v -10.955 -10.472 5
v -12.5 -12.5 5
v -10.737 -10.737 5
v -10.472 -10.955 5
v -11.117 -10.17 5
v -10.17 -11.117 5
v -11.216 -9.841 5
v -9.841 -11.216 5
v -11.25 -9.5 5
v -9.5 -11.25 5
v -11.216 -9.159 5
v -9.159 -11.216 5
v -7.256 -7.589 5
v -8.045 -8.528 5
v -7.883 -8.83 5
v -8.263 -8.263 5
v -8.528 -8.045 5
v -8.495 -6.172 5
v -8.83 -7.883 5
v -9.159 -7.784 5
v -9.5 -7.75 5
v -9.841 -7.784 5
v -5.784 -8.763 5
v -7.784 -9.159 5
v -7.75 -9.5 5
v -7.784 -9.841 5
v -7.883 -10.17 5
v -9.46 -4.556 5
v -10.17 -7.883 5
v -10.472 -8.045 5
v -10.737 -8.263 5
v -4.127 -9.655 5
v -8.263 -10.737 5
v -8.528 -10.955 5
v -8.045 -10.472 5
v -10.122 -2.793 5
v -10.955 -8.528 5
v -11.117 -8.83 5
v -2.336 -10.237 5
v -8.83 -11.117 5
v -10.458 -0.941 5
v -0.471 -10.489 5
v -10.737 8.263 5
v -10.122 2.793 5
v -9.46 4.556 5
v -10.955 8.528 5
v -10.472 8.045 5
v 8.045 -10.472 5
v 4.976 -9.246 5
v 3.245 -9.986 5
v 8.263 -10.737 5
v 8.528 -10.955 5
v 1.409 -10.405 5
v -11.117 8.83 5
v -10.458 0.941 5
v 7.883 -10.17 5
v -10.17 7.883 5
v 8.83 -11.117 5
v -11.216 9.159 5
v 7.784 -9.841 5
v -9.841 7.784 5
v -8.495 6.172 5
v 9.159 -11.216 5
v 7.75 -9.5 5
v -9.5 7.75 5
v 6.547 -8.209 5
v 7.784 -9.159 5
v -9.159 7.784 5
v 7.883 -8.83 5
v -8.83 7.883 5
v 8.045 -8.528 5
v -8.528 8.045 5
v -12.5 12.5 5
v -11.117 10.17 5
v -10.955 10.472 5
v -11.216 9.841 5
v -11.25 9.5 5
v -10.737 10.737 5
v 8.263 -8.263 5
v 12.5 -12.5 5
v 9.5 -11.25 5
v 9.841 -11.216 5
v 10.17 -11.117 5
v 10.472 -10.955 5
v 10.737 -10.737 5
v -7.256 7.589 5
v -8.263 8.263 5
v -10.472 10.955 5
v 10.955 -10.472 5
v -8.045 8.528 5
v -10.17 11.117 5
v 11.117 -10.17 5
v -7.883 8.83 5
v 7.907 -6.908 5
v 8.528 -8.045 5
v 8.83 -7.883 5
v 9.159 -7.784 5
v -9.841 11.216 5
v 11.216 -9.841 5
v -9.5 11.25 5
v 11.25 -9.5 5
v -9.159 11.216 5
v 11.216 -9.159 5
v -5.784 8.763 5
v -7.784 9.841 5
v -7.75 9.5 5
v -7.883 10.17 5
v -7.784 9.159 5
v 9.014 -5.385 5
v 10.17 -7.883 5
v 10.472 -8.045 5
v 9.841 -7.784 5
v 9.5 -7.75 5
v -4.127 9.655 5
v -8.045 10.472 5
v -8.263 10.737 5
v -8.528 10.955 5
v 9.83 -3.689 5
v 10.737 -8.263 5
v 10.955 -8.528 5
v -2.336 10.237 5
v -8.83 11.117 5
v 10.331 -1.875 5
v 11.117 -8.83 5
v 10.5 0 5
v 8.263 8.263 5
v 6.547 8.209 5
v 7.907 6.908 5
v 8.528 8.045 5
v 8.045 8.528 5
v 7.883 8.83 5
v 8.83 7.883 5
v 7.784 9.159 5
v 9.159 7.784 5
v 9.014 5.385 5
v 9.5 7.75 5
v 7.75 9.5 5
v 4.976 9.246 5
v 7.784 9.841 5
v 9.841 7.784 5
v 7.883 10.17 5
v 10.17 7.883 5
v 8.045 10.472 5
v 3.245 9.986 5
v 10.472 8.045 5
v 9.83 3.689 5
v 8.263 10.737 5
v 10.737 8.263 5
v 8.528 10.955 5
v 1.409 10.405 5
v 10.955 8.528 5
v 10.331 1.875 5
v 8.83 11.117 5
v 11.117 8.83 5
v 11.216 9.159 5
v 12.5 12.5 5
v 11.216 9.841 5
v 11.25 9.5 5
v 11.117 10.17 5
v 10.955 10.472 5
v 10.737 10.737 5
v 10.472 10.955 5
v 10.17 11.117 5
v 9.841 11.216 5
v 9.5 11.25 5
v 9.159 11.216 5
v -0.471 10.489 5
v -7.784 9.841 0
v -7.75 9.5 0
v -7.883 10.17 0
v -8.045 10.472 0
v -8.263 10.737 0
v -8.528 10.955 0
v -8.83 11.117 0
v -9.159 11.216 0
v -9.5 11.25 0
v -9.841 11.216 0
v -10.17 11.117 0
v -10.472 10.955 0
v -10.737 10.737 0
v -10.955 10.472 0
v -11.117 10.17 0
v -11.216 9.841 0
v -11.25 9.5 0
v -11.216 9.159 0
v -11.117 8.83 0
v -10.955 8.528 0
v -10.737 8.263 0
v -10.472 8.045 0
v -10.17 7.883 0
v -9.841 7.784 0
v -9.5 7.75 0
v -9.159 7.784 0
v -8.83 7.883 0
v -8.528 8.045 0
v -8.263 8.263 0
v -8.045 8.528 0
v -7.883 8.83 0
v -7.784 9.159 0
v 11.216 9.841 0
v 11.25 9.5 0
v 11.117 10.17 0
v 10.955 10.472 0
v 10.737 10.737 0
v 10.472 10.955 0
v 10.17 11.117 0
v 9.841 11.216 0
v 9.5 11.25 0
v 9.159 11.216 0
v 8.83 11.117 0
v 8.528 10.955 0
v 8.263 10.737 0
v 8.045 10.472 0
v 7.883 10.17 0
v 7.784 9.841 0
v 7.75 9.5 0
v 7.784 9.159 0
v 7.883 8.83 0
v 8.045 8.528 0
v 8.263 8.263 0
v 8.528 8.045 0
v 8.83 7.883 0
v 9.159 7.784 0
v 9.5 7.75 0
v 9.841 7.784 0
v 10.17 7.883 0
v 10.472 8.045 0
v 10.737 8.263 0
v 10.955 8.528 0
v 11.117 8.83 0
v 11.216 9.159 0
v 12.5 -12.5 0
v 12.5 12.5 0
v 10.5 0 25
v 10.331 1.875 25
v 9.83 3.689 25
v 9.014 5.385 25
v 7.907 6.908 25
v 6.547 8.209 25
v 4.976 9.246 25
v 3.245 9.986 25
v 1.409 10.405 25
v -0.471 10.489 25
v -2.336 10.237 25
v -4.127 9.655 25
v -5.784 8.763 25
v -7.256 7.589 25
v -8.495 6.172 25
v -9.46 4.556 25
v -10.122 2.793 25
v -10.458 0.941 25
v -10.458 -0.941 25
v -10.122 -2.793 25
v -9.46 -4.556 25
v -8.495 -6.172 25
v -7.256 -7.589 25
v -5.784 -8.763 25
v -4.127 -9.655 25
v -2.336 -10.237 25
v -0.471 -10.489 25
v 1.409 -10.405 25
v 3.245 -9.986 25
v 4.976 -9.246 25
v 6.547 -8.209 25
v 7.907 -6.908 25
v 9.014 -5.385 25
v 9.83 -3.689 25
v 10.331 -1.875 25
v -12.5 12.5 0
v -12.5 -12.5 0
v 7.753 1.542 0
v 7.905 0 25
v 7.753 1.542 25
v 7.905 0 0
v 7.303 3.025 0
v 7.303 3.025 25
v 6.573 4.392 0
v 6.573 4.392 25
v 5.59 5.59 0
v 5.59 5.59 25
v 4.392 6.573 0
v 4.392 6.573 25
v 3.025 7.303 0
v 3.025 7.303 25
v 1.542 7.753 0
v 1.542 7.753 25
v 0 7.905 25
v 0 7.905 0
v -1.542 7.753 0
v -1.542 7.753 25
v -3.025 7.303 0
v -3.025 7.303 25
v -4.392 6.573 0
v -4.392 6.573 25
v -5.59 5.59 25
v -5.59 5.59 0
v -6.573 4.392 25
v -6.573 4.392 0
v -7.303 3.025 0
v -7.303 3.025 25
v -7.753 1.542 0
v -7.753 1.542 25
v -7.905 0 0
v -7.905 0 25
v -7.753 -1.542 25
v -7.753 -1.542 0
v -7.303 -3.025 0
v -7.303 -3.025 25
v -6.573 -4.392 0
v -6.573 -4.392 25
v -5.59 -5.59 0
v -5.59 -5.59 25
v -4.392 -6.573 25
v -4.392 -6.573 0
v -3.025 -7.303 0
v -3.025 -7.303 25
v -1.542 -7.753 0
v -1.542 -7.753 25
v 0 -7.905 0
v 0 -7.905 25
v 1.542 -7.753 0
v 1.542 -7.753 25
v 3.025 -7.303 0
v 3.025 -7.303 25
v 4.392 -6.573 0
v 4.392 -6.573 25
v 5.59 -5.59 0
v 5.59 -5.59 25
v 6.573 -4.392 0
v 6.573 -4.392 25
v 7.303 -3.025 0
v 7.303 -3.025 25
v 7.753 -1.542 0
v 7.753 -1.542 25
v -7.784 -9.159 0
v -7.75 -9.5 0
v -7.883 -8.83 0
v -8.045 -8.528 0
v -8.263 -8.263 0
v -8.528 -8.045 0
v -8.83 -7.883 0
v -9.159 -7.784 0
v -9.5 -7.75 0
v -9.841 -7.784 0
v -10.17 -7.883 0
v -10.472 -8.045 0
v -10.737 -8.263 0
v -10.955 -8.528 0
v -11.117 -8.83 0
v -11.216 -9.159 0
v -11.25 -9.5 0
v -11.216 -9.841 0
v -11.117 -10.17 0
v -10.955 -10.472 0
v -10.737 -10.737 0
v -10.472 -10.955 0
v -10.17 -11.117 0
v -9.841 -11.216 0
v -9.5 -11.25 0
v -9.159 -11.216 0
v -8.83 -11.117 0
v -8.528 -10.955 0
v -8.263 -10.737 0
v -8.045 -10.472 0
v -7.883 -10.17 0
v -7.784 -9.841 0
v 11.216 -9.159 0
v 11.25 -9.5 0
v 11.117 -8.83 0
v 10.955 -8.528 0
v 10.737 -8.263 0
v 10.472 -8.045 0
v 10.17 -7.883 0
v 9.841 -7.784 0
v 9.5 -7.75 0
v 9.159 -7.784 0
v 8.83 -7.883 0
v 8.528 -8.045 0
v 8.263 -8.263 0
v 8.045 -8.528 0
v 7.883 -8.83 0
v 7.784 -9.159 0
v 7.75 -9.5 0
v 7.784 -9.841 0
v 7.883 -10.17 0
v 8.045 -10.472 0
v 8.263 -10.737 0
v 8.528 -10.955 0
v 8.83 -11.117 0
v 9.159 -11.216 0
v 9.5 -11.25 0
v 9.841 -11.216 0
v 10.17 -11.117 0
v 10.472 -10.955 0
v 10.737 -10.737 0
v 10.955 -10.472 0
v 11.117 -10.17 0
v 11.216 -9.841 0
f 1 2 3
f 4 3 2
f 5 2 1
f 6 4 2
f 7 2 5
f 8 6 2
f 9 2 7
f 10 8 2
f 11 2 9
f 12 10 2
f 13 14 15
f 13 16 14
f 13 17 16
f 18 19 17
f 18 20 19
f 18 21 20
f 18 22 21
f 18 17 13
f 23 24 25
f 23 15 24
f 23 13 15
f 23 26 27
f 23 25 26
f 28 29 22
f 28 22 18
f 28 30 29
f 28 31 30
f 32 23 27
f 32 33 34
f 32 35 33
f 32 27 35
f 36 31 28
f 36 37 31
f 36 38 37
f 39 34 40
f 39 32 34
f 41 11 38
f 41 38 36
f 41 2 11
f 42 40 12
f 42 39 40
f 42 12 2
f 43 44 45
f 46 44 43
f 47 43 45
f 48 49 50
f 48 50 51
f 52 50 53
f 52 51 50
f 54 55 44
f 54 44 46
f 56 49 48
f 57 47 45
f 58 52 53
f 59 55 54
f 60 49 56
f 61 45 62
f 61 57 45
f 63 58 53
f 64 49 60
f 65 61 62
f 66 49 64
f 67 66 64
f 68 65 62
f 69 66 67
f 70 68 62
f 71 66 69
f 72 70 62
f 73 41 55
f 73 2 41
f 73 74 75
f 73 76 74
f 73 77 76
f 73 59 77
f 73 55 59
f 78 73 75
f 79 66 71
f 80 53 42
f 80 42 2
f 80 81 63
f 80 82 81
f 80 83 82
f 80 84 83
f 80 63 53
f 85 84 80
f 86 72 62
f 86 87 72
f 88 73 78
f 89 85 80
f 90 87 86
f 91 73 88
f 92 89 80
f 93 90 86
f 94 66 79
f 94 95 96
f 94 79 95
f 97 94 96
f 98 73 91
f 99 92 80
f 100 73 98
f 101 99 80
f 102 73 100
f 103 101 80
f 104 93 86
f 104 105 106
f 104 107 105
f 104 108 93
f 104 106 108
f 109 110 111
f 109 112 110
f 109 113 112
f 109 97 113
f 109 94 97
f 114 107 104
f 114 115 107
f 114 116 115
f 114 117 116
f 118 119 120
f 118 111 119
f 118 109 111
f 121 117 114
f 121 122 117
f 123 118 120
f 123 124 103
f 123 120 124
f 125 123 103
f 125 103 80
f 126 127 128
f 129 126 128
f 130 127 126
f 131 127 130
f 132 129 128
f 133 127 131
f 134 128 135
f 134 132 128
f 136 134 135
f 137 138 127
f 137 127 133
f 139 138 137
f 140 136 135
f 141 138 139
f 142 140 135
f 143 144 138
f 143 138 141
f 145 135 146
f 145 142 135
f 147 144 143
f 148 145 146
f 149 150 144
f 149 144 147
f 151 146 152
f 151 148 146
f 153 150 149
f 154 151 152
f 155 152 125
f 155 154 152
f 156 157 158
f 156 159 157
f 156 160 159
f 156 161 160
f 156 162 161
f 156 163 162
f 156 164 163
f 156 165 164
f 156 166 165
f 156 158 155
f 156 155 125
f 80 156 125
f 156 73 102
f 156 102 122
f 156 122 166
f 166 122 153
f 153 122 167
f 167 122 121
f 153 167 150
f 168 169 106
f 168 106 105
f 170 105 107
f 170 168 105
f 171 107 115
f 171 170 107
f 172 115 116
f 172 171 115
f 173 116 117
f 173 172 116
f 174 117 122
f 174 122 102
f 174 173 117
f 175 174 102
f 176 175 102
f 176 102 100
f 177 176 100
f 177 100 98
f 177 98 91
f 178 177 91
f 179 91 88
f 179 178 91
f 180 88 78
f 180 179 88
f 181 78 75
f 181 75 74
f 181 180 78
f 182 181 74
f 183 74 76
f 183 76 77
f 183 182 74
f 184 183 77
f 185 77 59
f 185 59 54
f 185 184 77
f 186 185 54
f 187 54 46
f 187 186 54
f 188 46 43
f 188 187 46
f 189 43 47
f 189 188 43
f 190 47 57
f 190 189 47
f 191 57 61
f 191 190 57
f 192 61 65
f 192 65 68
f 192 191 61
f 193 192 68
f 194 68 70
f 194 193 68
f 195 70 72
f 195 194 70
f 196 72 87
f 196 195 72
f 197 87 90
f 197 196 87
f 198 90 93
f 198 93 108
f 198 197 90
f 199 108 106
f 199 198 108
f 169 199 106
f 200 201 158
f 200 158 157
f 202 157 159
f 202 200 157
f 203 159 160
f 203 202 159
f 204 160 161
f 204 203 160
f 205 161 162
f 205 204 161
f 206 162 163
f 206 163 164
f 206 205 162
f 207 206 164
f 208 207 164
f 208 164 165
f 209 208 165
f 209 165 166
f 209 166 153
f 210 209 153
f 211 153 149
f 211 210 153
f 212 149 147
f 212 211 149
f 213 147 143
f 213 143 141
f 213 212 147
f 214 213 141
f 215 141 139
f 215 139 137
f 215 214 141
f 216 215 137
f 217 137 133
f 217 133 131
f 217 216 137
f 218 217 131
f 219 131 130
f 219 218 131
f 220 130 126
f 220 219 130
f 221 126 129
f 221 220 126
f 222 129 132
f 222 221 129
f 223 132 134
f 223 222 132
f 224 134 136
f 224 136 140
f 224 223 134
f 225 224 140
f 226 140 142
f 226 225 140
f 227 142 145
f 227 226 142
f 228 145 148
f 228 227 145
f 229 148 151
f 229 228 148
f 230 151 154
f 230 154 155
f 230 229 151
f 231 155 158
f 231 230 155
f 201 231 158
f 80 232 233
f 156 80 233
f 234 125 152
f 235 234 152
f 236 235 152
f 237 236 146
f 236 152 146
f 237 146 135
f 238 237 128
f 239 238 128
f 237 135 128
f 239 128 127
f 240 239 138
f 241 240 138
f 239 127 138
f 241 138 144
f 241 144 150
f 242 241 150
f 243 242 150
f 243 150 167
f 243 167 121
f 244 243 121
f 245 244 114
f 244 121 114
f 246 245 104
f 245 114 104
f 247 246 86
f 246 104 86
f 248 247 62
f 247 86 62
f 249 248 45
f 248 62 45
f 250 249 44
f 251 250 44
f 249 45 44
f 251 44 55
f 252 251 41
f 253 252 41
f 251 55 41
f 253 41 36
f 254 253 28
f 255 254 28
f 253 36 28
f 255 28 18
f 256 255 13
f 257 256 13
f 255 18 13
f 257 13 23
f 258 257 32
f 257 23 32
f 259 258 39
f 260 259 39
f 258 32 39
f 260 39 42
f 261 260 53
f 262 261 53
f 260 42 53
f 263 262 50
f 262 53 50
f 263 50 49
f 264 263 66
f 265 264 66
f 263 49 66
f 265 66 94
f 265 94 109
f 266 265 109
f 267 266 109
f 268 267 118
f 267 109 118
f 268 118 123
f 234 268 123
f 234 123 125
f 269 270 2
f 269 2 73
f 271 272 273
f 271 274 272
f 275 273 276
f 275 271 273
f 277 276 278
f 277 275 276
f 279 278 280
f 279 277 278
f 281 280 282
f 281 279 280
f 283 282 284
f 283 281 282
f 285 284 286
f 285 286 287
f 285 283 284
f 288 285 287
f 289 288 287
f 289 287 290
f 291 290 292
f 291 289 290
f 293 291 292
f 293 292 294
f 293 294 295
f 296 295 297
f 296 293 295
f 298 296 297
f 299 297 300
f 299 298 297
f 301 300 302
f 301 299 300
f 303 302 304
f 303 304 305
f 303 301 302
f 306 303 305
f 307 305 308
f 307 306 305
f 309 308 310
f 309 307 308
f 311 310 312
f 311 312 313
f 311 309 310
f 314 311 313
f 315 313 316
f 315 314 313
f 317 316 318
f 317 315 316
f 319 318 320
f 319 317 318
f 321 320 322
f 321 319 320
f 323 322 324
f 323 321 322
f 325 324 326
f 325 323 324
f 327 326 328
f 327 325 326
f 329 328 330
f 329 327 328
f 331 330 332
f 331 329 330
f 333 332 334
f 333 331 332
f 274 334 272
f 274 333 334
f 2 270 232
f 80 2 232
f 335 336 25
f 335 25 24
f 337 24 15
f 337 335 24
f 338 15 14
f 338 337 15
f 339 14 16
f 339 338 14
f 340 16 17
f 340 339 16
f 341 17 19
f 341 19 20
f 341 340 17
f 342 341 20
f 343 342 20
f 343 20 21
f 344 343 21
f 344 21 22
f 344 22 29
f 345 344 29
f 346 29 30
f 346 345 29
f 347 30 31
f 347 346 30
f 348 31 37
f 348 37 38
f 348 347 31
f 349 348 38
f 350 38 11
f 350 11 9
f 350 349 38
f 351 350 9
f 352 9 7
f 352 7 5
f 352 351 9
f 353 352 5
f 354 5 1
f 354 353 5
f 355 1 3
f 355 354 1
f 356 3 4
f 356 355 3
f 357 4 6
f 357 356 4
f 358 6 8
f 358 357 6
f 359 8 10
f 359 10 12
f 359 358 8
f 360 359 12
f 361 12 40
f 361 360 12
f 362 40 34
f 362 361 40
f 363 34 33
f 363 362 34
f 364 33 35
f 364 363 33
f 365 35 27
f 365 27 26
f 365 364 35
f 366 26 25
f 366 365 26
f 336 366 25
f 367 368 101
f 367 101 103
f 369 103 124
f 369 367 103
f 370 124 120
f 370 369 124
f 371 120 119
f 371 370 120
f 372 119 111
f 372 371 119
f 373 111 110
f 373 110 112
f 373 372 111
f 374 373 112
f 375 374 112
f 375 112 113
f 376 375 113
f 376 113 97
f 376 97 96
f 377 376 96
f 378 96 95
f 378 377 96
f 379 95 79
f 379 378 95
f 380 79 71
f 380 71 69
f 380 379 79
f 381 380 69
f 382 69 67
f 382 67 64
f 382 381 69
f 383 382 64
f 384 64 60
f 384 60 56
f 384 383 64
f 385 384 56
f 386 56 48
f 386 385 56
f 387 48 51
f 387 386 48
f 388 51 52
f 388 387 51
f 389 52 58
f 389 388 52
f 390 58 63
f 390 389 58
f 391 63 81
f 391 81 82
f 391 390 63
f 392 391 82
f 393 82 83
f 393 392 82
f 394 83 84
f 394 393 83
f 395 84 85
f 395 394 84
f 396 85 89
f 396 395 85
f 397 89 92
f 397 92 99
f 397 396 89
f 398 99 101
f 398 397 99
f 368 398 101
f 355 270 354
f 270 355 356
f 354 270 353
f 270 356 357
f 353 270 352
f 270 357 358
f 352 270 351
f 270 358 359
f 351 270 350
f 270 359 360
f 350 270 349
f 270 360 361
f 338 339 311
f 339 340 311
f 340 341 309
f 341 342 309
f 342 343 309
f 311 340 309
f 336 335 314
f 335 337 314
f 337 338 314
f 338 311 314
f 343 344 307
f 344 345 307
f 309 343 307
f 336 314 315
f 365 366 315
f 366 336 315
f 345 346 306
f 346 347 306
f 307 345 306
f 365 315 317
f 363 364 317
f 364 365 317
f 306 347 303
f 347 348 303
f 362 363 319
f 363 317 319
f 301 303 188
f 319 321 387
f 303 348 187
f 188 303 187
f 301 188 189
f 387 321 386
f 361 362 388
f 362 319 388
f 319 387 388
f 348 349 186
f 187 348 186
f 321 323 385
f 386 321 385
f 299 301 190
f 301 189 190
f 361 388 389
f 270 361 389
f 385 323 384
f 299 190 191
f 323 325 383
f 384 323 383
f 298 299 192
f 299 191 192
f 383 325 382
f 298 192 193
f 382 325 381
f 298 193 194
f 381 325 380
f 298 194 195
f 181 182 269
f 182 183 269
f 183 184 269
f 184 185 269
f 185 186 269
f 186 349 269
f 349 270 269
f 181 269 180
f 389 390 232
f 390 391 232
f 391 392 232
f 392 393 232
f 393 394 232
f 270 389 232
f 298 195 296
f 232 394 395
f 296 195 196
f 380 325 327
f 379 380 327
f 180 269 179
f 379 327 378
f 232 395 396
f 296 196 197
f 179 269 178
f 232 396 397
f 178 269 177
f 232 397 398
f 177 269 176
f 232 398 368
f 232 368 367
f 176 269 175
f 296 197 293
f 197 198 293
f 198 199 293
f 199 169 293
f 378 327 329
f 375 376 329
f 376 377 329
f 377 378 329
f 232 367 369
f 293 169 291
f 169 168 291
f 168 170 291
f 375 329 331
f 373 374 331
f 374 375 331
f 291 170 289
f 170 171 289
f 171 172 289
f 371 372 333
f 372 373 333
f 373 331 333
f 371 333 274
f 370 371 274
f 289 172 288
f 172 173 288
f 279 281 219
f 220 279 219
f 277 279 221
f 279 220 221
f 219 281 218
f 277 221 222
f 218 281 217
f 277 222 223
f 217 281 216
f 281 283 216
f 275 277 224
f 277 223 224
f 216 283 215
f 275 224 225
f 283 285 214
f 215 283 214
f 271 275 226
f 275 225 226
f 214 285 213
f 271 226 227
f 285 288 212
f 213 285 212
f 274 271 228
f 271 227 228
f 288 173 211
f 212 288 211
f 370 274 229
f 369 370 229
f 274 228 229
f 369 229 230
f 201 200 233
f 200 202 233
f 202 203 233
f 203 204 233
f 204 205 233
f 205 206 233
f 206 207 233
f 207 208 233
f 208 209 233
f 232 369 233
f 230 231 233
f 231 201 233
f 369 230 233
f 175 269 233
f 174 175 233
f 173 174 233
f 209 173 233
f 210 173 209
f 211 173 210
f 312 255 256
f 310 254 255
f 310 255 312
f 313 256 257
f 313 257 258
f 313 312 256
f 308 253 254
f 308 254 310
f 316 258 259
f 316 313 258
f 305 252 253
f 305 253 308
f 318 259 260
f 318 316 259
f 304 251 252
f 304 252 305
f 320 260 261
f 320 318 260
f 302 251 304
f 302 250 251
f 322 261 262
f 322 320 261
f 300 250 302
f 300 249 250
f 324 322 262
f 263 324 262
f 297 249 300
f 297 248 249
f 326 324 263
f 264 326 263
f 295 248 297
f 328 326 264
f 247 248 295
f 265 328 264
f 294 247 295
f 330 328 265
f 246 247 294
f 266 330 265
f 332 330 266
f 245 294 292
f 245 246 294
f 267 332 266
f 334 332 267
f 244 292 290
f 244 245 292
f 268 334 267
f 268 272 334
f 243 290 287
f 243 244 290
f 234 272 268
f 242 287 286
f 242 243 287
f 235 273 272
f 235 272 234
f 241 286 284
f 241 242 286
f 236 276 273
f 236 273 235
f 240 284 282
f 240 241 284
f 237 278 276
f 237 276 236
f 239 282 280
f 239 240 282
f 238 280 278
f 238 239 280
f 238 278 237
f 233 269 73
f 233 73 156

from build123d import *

# Parameters (mm, degrees)
SKETCH_1_W          = 25
SKETCH_1_H          = 25
SKETCH_1_R          = 1.75
EXTRUDE_1_DEPTH     = 5
SKETCH_2_R          = 7.905
CUT_EXTRUDE_1_DEPTH = 5
SKETCH_3_R          = 10.5
SKETCH_3_R_2        = 7.905
EXTRUDE_2_DEPTH     = 20


with BuildPart() as part:
    # 草图1 → 凸台-拉伸1 (new body)
    with BuildSketch(Plane.XY):
        Rectangle(SKETCH_1_W, SKETCH_1_H)
        with Locations((-9.5, 9.5)):
            Circle(SKETCH_1_R, mode=Mode.SUBTRACT)
        with Locations((-9.5, -9.5)):
            Circle(SKETCH_1_R, mode=Mode.SUBTRACT)
        with Locations((9.5, -9.5)):
            Circle(SKETCH_1_R, mode=Mode.SUBTRACT)
        with Locations((9.5, 9.5)):
            Circle(SKETCH_1_R, mode=Mode.SUBTRACT)
    extrude(amount=EXTRUDE_1_DEPTH)

    # 草图2 → 切除-拉伸1 (cut)
    with BuildSketch(Plane.XY.offset(5)):
        Circle(SKETCH_2_R)
    extrude(amount=-CUT_EXTRUDE_1_DEPTH, mode=Mode.SUBTRACT)

    # 草图3 → 凸台-拉伸2 (add)
    with BuildSketch(Plane.XY.offset(5)):
        Circle(SKETCH_3_R)
        Circle(SKETCH_3_R_2, mode=Mode.SUBTRACT)
    extrude(amount=EXTRUDE_2_DEPTH)


solid = part.part
